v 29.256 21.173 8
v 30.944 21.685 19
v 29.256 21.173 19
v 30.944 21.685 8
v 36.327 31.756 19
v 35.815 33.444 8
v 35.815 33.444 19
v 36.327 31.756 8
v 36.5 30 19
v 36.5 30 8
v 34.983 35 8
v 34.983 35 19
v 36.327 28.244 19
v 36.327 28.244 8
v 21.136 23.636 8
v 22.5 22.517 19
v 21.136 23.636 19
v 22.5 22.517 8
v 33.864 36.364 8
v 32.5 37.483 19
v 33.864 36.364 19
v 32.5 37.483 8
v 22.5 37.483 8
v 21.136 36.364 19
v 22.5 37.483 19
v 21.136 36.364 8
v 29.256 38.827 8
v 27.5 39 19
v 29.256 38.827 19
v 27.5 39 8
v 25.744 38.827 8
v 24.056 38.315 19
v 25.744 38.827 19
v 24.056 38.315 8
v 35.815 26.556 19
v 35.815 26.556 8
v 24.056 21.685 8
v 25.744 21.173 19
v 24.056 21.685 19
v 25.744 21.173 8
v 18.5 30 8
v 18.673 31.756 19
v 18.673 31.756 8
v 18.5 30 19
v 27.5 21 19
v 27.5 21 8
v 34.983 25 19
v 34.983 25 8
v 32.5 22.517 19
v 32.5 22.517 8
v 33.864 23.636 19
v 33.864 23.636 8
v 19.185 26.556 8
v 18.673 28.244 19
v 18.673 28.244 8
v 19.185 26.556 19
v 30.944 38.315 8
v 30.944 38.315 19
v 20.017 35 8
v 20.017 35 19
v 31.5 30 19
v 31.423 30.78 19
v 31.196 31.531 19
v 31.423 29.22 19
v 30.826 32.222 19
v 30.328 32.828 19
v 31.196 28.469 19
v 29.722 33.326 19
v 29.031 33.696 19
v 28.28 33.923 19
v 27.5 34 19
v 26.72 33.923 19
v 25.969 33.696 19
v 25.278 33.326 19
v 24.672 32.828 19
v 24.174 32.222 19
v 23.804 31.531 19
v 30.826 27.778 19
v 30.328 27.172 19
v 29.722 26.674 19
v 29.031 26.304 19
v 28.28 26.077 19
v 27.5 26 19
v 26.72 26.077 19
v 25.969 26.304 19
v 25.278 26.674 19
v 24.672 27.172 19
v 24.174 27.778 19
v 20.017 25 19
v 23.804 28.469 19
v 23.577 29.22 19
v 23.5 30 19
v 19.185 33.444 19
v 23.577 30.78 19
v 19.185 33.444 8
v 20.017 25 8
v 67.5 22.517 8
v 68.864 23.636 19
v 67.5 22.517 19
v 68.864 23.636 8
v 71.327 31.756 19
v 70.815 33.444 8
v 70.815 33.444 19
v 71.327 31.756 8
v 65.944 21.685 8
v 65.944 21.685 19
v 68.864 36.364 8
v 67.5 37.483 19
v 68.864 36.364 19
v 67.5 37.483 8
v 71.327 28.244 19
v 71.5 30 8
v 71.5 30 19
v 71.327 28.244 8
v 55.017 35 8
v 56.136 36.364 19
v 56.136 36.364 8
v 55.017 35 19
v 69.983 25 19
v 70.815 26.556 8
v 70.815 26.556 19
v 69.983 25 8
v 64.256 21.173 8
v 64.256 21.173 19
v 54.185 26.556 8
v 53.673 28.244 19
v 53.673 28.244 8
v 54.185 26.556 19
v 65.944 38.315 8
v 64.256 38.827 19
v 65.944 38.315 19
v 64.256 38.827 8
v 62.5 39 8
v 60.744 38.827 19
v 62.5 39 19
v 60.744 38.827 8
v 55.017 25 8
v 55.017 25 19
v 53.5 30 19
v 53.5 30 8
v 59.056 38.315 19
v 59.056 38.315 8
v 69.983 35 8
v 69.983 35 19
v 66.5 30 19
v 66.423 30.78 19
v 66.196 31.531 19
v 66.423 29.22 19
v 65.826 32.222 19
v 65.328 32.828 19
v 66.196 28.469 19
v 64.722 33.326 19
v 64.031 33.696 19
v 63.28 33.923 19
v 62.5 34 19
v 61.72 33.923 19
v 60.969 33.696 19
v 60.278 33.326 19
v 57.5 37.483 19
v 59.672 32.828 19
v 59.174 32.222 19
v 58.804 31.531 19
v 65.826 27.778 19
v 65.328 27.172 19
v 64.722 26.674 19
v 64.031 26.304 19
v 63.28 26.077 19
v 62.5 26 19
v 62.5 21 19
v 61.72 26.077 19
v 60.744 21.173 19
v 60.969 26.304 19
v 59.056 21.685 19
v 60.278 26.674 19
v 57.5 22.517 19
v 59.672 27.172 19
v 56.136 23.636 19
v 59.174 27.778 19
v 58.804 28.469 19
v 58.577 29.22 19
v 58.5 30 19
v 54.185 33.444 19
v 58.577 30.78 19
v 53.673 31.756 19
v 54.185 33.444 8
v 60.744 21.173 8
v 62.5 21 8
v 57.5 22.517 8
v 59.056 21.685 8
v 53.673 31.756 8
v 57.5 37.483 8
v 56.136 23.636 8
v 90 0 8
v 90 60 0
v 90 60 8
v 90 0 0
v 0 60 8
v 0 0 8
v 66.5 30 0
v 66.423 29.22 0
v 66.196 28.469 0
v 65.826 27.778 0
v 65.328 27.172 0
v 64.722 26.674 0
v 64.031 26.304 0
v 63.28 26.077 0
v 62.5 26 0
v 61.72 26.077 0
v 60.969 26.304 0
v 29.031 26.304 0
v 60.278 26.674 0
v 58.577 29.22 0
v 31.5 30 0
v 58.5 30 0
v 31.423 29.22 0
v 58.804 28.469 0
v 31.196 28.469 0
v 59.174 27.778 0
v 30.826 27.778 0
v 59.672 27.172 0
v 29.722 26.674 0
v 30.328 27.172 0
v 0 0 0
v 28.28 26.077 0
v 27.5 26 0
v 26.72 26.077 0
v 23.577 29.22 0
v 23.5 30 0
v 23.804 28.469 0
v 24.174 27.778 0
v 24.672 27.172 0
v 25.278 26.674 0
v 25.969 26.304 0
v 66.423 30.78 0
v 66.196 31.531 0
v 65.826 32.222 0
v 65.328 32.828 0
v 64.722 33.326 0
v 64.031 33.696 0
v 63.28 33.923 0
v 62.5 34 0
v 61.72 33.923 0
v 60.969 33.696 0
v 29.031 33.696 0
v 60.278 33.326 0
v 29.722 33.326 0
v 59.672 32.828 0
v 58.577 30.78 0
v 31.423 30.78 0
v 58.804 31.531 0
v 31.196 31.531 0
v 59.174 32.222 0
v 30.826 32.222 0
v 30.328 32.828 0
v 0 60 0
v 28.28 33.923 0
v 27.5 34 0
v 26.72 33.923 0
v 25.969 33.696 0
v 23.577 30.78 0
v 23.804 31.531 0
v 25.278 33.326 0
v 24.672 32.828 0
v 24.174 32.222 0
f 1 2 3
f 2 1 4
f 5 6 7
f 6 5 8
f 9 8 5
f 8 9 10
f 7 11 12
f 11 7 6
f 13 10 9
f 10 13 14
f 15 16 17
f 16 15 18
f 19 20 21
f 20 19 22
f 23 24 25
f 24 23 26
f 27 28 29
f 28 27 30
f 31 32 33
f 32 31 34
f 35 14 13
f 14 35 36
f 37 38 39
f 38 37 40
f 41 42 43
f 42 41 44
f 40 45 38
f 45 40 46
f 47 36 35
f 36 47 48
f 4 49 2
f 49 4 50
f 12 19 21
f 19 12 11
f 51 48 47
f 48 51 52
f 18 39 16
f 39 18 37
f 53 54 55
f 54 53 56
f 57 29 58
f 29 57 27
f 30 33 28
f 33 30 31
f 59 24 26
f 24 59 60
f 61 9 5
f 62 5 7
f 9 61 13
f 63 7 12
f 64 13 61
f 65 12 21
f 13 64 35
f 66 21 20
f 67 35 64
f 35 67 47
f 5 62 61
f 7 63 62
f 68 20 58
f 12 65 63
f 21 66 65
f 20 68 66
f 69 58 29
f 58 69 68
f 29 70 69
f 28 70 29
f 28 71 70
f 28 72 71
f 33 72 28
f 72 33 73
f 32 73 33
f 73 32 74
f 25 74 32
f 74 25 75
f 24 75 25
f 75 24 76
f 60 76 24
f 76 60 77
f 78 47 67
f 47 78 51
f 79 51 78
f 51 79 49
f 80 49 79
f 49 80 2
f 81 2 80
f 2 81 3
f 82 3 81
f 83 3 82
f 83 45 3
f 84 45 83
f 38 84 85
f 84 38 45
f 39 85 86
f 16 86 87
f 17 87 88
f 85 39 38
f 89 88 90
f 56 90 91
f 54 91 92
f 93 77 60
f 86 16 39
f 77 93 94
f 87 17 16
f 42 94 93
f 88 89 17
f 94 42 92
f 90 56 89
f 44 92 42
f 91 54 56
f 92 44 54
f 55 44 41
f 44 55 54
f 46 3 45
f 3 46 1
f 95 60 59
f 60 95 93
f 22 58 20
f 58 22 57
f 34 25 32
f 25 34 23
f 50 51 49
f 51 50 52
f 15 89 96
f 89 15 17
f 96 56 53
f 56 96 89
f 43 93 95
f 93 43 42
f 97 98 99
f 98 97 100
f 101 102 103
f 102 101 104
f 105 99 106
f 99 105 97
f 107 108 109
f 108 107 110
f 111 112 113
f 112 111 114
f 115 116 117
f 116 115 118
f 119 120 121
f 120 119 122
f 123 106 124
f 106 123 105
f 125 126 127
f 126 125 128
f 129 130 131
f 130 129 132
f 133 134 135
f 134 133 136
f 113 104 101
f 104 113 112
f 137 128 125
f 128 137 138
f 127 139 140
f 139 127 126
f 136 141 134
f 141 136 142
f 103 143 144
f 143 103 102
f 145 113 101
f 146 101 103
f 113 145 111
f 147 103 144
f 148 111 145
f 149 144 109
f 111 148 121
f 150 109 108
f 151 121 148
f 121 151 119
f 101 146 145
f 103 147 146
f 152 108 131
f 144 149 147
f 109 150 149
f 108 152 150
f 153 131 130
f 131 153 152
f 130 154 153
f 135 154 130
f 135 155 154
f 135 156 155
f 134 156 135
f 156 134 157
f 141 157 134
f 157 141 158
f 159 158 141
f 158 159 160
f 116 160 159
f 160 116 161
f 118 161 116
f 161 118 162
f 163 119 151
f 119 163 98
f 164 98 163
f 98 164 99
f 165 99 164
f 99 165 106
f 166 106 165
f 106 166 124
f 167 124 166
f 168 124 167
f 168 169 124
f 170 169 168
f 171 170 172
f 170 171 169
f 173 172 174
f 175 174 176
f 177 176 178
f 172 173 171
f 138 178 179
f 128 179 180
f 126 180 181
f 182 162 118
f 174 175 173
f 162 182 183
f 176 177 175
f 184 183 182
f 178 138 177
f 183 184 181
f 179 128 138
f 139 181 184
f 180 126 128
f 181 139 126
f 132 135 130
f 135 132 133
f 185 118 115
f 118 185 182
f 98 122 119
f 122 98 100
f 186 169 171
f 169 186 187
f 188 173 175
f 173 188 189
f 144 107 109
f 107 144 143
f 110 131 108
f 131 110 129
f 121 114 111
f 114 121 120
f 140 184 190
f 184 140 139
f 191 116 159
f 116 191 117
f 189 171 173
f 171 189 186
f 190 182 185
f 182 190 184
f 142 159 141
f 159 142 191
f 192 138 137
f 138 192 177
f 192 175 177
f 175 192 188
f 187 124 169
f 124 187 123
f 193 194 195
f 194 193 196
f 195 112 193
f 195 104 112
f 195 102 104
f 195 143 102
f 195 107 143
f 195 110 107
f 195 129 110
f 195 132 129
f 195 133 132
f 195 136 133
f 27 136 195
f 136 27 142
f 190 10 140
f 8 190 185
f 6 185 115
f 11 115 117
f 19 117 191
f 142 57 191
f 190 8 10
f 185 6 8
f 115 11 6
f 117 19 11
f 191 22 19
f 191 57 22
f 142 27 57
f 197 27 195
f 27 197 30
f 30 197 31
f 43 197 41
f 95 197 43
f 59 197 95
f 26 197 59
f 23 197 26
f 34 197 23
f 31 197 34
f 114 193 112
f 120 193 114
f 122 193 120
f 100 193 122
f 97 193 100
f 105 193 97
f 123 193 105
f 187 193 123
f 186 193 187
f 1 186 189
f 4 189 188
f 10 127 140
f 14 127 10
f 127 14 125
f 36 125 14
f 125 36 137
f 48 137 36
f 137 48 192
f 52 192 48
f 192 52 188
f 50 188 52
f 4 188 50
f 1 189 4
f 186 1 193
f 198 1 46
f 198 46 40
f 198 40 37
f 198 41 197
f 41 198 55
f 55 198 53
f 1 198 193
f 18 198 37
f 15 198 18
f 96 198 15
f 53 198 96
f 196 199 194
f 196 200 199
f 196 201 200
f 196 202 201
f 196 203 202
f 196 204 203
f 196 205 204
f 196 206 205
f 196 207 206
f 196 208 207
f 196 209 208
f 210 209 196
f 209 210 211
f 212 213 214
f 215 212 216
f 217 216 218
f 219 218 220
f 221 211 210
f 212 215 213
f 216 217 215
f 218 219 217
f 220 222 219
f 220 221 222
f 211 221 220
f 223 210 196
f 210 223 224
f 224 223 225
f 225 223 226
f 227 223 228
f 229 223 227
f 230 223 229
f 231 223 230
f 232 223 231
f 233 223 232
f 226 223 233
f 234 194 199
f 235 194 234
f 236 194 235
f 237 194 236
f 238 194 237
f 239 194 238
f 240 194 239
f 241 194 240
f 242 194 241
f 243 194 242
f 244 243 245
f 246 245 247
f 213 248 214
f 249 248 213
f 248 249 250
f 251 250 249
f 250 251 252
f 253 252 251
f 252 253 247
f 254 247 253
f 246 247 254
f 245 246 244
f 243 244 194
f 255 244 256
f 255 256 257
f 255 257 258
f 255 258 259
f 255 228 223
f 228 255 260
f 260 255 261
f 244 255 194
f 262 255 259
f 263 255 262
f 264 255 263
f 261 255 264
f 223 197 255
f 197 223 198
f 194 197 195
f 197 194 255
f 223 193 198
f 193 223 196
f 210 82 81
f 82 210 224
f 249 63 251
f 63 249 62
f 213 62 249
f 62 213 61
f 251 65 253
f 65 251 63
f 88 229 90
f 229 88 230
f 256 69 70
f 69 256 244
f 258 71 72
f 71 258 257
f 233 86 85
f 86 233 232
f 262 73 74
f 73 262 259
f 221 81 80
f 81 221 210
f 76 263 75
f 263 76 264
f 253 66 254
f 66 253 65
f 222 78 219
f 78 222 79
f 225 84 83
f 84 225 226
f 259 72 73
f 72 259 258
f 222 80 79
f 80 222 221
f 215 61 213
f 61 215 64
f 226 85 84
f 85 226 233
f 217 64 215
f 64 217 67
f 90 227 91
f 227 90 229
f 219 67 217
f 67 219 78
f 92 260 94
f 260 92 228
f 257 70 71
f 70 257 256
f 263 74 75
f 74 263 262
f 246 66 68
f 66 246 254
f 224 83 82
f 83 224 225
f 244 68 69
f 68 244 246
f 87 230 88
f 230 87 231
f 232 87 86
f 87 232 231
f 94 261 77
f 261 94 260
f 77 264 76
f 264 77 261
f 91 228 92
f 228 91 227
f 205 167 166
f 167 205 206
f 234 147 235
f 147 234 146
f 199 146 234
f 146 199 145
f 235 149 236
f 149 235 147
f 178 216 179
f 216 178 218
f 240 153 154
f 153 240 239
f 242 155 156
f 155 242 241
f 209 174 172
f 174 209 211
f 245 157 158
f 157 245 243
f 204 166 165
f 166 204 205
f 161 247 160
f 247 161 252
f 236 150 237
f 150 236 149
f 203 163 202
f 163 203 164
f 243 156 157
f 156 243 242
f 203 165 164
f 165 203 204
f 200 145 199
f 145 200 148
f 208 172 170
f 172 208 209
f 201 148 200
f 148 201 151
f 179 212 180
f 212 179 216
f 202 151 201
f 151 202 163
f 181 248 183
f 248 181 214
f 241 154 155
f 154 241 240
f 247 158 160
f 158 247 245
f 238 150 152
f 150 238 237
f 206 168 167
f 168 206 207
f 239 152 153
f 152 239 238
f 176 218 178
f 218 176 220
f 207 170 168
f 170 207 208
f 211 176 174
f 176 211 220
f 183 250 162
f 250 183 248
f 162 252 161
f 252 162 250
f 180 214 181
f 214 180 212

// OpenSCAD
$fn = 32;

// ----------------------------------------------------------------------
// Drill jig: two_boss jig
// ----------------------------------------------------------------------

// --- parameters (mm) ---
plate_l = 90;             // plate length, X
plate_w = 60;             // plate width, Y
plate_t = 8;              // plate thickness
boss_d = 18;              // guide boss diameter
boss_h = 12;              // boss height above the plate
guide_d = 8;              // guide hole diameter
boss_pitch = 35;          // boss pitch

n_boss = 2;  // guide bosses
boss_x0 = (plate_l - (n_boss - 1) * boss_pitch) / 2;  // first boss X
boss_top = plate_t - 1 + boss_h;  // boss crown height
total_h = boss_top;  // overall height

difference() {
  union() {
  cube([plate_l, plate_w, plate_t]);
  for (i = [0 : n_boss - 1])
    translate([boss_x0 + i * boss_pitch, plate_w / 2, plate_t - 1])
      cylinder(h = boss_h, d = boss_d);
  }
  for (i = [0 : n_boss - 1])
    translate([boss_x0 + i * boss_pitch, plate_w / 2, -1])
      cylinder(h = plate_t + boss_h, d = guide_d);
}
